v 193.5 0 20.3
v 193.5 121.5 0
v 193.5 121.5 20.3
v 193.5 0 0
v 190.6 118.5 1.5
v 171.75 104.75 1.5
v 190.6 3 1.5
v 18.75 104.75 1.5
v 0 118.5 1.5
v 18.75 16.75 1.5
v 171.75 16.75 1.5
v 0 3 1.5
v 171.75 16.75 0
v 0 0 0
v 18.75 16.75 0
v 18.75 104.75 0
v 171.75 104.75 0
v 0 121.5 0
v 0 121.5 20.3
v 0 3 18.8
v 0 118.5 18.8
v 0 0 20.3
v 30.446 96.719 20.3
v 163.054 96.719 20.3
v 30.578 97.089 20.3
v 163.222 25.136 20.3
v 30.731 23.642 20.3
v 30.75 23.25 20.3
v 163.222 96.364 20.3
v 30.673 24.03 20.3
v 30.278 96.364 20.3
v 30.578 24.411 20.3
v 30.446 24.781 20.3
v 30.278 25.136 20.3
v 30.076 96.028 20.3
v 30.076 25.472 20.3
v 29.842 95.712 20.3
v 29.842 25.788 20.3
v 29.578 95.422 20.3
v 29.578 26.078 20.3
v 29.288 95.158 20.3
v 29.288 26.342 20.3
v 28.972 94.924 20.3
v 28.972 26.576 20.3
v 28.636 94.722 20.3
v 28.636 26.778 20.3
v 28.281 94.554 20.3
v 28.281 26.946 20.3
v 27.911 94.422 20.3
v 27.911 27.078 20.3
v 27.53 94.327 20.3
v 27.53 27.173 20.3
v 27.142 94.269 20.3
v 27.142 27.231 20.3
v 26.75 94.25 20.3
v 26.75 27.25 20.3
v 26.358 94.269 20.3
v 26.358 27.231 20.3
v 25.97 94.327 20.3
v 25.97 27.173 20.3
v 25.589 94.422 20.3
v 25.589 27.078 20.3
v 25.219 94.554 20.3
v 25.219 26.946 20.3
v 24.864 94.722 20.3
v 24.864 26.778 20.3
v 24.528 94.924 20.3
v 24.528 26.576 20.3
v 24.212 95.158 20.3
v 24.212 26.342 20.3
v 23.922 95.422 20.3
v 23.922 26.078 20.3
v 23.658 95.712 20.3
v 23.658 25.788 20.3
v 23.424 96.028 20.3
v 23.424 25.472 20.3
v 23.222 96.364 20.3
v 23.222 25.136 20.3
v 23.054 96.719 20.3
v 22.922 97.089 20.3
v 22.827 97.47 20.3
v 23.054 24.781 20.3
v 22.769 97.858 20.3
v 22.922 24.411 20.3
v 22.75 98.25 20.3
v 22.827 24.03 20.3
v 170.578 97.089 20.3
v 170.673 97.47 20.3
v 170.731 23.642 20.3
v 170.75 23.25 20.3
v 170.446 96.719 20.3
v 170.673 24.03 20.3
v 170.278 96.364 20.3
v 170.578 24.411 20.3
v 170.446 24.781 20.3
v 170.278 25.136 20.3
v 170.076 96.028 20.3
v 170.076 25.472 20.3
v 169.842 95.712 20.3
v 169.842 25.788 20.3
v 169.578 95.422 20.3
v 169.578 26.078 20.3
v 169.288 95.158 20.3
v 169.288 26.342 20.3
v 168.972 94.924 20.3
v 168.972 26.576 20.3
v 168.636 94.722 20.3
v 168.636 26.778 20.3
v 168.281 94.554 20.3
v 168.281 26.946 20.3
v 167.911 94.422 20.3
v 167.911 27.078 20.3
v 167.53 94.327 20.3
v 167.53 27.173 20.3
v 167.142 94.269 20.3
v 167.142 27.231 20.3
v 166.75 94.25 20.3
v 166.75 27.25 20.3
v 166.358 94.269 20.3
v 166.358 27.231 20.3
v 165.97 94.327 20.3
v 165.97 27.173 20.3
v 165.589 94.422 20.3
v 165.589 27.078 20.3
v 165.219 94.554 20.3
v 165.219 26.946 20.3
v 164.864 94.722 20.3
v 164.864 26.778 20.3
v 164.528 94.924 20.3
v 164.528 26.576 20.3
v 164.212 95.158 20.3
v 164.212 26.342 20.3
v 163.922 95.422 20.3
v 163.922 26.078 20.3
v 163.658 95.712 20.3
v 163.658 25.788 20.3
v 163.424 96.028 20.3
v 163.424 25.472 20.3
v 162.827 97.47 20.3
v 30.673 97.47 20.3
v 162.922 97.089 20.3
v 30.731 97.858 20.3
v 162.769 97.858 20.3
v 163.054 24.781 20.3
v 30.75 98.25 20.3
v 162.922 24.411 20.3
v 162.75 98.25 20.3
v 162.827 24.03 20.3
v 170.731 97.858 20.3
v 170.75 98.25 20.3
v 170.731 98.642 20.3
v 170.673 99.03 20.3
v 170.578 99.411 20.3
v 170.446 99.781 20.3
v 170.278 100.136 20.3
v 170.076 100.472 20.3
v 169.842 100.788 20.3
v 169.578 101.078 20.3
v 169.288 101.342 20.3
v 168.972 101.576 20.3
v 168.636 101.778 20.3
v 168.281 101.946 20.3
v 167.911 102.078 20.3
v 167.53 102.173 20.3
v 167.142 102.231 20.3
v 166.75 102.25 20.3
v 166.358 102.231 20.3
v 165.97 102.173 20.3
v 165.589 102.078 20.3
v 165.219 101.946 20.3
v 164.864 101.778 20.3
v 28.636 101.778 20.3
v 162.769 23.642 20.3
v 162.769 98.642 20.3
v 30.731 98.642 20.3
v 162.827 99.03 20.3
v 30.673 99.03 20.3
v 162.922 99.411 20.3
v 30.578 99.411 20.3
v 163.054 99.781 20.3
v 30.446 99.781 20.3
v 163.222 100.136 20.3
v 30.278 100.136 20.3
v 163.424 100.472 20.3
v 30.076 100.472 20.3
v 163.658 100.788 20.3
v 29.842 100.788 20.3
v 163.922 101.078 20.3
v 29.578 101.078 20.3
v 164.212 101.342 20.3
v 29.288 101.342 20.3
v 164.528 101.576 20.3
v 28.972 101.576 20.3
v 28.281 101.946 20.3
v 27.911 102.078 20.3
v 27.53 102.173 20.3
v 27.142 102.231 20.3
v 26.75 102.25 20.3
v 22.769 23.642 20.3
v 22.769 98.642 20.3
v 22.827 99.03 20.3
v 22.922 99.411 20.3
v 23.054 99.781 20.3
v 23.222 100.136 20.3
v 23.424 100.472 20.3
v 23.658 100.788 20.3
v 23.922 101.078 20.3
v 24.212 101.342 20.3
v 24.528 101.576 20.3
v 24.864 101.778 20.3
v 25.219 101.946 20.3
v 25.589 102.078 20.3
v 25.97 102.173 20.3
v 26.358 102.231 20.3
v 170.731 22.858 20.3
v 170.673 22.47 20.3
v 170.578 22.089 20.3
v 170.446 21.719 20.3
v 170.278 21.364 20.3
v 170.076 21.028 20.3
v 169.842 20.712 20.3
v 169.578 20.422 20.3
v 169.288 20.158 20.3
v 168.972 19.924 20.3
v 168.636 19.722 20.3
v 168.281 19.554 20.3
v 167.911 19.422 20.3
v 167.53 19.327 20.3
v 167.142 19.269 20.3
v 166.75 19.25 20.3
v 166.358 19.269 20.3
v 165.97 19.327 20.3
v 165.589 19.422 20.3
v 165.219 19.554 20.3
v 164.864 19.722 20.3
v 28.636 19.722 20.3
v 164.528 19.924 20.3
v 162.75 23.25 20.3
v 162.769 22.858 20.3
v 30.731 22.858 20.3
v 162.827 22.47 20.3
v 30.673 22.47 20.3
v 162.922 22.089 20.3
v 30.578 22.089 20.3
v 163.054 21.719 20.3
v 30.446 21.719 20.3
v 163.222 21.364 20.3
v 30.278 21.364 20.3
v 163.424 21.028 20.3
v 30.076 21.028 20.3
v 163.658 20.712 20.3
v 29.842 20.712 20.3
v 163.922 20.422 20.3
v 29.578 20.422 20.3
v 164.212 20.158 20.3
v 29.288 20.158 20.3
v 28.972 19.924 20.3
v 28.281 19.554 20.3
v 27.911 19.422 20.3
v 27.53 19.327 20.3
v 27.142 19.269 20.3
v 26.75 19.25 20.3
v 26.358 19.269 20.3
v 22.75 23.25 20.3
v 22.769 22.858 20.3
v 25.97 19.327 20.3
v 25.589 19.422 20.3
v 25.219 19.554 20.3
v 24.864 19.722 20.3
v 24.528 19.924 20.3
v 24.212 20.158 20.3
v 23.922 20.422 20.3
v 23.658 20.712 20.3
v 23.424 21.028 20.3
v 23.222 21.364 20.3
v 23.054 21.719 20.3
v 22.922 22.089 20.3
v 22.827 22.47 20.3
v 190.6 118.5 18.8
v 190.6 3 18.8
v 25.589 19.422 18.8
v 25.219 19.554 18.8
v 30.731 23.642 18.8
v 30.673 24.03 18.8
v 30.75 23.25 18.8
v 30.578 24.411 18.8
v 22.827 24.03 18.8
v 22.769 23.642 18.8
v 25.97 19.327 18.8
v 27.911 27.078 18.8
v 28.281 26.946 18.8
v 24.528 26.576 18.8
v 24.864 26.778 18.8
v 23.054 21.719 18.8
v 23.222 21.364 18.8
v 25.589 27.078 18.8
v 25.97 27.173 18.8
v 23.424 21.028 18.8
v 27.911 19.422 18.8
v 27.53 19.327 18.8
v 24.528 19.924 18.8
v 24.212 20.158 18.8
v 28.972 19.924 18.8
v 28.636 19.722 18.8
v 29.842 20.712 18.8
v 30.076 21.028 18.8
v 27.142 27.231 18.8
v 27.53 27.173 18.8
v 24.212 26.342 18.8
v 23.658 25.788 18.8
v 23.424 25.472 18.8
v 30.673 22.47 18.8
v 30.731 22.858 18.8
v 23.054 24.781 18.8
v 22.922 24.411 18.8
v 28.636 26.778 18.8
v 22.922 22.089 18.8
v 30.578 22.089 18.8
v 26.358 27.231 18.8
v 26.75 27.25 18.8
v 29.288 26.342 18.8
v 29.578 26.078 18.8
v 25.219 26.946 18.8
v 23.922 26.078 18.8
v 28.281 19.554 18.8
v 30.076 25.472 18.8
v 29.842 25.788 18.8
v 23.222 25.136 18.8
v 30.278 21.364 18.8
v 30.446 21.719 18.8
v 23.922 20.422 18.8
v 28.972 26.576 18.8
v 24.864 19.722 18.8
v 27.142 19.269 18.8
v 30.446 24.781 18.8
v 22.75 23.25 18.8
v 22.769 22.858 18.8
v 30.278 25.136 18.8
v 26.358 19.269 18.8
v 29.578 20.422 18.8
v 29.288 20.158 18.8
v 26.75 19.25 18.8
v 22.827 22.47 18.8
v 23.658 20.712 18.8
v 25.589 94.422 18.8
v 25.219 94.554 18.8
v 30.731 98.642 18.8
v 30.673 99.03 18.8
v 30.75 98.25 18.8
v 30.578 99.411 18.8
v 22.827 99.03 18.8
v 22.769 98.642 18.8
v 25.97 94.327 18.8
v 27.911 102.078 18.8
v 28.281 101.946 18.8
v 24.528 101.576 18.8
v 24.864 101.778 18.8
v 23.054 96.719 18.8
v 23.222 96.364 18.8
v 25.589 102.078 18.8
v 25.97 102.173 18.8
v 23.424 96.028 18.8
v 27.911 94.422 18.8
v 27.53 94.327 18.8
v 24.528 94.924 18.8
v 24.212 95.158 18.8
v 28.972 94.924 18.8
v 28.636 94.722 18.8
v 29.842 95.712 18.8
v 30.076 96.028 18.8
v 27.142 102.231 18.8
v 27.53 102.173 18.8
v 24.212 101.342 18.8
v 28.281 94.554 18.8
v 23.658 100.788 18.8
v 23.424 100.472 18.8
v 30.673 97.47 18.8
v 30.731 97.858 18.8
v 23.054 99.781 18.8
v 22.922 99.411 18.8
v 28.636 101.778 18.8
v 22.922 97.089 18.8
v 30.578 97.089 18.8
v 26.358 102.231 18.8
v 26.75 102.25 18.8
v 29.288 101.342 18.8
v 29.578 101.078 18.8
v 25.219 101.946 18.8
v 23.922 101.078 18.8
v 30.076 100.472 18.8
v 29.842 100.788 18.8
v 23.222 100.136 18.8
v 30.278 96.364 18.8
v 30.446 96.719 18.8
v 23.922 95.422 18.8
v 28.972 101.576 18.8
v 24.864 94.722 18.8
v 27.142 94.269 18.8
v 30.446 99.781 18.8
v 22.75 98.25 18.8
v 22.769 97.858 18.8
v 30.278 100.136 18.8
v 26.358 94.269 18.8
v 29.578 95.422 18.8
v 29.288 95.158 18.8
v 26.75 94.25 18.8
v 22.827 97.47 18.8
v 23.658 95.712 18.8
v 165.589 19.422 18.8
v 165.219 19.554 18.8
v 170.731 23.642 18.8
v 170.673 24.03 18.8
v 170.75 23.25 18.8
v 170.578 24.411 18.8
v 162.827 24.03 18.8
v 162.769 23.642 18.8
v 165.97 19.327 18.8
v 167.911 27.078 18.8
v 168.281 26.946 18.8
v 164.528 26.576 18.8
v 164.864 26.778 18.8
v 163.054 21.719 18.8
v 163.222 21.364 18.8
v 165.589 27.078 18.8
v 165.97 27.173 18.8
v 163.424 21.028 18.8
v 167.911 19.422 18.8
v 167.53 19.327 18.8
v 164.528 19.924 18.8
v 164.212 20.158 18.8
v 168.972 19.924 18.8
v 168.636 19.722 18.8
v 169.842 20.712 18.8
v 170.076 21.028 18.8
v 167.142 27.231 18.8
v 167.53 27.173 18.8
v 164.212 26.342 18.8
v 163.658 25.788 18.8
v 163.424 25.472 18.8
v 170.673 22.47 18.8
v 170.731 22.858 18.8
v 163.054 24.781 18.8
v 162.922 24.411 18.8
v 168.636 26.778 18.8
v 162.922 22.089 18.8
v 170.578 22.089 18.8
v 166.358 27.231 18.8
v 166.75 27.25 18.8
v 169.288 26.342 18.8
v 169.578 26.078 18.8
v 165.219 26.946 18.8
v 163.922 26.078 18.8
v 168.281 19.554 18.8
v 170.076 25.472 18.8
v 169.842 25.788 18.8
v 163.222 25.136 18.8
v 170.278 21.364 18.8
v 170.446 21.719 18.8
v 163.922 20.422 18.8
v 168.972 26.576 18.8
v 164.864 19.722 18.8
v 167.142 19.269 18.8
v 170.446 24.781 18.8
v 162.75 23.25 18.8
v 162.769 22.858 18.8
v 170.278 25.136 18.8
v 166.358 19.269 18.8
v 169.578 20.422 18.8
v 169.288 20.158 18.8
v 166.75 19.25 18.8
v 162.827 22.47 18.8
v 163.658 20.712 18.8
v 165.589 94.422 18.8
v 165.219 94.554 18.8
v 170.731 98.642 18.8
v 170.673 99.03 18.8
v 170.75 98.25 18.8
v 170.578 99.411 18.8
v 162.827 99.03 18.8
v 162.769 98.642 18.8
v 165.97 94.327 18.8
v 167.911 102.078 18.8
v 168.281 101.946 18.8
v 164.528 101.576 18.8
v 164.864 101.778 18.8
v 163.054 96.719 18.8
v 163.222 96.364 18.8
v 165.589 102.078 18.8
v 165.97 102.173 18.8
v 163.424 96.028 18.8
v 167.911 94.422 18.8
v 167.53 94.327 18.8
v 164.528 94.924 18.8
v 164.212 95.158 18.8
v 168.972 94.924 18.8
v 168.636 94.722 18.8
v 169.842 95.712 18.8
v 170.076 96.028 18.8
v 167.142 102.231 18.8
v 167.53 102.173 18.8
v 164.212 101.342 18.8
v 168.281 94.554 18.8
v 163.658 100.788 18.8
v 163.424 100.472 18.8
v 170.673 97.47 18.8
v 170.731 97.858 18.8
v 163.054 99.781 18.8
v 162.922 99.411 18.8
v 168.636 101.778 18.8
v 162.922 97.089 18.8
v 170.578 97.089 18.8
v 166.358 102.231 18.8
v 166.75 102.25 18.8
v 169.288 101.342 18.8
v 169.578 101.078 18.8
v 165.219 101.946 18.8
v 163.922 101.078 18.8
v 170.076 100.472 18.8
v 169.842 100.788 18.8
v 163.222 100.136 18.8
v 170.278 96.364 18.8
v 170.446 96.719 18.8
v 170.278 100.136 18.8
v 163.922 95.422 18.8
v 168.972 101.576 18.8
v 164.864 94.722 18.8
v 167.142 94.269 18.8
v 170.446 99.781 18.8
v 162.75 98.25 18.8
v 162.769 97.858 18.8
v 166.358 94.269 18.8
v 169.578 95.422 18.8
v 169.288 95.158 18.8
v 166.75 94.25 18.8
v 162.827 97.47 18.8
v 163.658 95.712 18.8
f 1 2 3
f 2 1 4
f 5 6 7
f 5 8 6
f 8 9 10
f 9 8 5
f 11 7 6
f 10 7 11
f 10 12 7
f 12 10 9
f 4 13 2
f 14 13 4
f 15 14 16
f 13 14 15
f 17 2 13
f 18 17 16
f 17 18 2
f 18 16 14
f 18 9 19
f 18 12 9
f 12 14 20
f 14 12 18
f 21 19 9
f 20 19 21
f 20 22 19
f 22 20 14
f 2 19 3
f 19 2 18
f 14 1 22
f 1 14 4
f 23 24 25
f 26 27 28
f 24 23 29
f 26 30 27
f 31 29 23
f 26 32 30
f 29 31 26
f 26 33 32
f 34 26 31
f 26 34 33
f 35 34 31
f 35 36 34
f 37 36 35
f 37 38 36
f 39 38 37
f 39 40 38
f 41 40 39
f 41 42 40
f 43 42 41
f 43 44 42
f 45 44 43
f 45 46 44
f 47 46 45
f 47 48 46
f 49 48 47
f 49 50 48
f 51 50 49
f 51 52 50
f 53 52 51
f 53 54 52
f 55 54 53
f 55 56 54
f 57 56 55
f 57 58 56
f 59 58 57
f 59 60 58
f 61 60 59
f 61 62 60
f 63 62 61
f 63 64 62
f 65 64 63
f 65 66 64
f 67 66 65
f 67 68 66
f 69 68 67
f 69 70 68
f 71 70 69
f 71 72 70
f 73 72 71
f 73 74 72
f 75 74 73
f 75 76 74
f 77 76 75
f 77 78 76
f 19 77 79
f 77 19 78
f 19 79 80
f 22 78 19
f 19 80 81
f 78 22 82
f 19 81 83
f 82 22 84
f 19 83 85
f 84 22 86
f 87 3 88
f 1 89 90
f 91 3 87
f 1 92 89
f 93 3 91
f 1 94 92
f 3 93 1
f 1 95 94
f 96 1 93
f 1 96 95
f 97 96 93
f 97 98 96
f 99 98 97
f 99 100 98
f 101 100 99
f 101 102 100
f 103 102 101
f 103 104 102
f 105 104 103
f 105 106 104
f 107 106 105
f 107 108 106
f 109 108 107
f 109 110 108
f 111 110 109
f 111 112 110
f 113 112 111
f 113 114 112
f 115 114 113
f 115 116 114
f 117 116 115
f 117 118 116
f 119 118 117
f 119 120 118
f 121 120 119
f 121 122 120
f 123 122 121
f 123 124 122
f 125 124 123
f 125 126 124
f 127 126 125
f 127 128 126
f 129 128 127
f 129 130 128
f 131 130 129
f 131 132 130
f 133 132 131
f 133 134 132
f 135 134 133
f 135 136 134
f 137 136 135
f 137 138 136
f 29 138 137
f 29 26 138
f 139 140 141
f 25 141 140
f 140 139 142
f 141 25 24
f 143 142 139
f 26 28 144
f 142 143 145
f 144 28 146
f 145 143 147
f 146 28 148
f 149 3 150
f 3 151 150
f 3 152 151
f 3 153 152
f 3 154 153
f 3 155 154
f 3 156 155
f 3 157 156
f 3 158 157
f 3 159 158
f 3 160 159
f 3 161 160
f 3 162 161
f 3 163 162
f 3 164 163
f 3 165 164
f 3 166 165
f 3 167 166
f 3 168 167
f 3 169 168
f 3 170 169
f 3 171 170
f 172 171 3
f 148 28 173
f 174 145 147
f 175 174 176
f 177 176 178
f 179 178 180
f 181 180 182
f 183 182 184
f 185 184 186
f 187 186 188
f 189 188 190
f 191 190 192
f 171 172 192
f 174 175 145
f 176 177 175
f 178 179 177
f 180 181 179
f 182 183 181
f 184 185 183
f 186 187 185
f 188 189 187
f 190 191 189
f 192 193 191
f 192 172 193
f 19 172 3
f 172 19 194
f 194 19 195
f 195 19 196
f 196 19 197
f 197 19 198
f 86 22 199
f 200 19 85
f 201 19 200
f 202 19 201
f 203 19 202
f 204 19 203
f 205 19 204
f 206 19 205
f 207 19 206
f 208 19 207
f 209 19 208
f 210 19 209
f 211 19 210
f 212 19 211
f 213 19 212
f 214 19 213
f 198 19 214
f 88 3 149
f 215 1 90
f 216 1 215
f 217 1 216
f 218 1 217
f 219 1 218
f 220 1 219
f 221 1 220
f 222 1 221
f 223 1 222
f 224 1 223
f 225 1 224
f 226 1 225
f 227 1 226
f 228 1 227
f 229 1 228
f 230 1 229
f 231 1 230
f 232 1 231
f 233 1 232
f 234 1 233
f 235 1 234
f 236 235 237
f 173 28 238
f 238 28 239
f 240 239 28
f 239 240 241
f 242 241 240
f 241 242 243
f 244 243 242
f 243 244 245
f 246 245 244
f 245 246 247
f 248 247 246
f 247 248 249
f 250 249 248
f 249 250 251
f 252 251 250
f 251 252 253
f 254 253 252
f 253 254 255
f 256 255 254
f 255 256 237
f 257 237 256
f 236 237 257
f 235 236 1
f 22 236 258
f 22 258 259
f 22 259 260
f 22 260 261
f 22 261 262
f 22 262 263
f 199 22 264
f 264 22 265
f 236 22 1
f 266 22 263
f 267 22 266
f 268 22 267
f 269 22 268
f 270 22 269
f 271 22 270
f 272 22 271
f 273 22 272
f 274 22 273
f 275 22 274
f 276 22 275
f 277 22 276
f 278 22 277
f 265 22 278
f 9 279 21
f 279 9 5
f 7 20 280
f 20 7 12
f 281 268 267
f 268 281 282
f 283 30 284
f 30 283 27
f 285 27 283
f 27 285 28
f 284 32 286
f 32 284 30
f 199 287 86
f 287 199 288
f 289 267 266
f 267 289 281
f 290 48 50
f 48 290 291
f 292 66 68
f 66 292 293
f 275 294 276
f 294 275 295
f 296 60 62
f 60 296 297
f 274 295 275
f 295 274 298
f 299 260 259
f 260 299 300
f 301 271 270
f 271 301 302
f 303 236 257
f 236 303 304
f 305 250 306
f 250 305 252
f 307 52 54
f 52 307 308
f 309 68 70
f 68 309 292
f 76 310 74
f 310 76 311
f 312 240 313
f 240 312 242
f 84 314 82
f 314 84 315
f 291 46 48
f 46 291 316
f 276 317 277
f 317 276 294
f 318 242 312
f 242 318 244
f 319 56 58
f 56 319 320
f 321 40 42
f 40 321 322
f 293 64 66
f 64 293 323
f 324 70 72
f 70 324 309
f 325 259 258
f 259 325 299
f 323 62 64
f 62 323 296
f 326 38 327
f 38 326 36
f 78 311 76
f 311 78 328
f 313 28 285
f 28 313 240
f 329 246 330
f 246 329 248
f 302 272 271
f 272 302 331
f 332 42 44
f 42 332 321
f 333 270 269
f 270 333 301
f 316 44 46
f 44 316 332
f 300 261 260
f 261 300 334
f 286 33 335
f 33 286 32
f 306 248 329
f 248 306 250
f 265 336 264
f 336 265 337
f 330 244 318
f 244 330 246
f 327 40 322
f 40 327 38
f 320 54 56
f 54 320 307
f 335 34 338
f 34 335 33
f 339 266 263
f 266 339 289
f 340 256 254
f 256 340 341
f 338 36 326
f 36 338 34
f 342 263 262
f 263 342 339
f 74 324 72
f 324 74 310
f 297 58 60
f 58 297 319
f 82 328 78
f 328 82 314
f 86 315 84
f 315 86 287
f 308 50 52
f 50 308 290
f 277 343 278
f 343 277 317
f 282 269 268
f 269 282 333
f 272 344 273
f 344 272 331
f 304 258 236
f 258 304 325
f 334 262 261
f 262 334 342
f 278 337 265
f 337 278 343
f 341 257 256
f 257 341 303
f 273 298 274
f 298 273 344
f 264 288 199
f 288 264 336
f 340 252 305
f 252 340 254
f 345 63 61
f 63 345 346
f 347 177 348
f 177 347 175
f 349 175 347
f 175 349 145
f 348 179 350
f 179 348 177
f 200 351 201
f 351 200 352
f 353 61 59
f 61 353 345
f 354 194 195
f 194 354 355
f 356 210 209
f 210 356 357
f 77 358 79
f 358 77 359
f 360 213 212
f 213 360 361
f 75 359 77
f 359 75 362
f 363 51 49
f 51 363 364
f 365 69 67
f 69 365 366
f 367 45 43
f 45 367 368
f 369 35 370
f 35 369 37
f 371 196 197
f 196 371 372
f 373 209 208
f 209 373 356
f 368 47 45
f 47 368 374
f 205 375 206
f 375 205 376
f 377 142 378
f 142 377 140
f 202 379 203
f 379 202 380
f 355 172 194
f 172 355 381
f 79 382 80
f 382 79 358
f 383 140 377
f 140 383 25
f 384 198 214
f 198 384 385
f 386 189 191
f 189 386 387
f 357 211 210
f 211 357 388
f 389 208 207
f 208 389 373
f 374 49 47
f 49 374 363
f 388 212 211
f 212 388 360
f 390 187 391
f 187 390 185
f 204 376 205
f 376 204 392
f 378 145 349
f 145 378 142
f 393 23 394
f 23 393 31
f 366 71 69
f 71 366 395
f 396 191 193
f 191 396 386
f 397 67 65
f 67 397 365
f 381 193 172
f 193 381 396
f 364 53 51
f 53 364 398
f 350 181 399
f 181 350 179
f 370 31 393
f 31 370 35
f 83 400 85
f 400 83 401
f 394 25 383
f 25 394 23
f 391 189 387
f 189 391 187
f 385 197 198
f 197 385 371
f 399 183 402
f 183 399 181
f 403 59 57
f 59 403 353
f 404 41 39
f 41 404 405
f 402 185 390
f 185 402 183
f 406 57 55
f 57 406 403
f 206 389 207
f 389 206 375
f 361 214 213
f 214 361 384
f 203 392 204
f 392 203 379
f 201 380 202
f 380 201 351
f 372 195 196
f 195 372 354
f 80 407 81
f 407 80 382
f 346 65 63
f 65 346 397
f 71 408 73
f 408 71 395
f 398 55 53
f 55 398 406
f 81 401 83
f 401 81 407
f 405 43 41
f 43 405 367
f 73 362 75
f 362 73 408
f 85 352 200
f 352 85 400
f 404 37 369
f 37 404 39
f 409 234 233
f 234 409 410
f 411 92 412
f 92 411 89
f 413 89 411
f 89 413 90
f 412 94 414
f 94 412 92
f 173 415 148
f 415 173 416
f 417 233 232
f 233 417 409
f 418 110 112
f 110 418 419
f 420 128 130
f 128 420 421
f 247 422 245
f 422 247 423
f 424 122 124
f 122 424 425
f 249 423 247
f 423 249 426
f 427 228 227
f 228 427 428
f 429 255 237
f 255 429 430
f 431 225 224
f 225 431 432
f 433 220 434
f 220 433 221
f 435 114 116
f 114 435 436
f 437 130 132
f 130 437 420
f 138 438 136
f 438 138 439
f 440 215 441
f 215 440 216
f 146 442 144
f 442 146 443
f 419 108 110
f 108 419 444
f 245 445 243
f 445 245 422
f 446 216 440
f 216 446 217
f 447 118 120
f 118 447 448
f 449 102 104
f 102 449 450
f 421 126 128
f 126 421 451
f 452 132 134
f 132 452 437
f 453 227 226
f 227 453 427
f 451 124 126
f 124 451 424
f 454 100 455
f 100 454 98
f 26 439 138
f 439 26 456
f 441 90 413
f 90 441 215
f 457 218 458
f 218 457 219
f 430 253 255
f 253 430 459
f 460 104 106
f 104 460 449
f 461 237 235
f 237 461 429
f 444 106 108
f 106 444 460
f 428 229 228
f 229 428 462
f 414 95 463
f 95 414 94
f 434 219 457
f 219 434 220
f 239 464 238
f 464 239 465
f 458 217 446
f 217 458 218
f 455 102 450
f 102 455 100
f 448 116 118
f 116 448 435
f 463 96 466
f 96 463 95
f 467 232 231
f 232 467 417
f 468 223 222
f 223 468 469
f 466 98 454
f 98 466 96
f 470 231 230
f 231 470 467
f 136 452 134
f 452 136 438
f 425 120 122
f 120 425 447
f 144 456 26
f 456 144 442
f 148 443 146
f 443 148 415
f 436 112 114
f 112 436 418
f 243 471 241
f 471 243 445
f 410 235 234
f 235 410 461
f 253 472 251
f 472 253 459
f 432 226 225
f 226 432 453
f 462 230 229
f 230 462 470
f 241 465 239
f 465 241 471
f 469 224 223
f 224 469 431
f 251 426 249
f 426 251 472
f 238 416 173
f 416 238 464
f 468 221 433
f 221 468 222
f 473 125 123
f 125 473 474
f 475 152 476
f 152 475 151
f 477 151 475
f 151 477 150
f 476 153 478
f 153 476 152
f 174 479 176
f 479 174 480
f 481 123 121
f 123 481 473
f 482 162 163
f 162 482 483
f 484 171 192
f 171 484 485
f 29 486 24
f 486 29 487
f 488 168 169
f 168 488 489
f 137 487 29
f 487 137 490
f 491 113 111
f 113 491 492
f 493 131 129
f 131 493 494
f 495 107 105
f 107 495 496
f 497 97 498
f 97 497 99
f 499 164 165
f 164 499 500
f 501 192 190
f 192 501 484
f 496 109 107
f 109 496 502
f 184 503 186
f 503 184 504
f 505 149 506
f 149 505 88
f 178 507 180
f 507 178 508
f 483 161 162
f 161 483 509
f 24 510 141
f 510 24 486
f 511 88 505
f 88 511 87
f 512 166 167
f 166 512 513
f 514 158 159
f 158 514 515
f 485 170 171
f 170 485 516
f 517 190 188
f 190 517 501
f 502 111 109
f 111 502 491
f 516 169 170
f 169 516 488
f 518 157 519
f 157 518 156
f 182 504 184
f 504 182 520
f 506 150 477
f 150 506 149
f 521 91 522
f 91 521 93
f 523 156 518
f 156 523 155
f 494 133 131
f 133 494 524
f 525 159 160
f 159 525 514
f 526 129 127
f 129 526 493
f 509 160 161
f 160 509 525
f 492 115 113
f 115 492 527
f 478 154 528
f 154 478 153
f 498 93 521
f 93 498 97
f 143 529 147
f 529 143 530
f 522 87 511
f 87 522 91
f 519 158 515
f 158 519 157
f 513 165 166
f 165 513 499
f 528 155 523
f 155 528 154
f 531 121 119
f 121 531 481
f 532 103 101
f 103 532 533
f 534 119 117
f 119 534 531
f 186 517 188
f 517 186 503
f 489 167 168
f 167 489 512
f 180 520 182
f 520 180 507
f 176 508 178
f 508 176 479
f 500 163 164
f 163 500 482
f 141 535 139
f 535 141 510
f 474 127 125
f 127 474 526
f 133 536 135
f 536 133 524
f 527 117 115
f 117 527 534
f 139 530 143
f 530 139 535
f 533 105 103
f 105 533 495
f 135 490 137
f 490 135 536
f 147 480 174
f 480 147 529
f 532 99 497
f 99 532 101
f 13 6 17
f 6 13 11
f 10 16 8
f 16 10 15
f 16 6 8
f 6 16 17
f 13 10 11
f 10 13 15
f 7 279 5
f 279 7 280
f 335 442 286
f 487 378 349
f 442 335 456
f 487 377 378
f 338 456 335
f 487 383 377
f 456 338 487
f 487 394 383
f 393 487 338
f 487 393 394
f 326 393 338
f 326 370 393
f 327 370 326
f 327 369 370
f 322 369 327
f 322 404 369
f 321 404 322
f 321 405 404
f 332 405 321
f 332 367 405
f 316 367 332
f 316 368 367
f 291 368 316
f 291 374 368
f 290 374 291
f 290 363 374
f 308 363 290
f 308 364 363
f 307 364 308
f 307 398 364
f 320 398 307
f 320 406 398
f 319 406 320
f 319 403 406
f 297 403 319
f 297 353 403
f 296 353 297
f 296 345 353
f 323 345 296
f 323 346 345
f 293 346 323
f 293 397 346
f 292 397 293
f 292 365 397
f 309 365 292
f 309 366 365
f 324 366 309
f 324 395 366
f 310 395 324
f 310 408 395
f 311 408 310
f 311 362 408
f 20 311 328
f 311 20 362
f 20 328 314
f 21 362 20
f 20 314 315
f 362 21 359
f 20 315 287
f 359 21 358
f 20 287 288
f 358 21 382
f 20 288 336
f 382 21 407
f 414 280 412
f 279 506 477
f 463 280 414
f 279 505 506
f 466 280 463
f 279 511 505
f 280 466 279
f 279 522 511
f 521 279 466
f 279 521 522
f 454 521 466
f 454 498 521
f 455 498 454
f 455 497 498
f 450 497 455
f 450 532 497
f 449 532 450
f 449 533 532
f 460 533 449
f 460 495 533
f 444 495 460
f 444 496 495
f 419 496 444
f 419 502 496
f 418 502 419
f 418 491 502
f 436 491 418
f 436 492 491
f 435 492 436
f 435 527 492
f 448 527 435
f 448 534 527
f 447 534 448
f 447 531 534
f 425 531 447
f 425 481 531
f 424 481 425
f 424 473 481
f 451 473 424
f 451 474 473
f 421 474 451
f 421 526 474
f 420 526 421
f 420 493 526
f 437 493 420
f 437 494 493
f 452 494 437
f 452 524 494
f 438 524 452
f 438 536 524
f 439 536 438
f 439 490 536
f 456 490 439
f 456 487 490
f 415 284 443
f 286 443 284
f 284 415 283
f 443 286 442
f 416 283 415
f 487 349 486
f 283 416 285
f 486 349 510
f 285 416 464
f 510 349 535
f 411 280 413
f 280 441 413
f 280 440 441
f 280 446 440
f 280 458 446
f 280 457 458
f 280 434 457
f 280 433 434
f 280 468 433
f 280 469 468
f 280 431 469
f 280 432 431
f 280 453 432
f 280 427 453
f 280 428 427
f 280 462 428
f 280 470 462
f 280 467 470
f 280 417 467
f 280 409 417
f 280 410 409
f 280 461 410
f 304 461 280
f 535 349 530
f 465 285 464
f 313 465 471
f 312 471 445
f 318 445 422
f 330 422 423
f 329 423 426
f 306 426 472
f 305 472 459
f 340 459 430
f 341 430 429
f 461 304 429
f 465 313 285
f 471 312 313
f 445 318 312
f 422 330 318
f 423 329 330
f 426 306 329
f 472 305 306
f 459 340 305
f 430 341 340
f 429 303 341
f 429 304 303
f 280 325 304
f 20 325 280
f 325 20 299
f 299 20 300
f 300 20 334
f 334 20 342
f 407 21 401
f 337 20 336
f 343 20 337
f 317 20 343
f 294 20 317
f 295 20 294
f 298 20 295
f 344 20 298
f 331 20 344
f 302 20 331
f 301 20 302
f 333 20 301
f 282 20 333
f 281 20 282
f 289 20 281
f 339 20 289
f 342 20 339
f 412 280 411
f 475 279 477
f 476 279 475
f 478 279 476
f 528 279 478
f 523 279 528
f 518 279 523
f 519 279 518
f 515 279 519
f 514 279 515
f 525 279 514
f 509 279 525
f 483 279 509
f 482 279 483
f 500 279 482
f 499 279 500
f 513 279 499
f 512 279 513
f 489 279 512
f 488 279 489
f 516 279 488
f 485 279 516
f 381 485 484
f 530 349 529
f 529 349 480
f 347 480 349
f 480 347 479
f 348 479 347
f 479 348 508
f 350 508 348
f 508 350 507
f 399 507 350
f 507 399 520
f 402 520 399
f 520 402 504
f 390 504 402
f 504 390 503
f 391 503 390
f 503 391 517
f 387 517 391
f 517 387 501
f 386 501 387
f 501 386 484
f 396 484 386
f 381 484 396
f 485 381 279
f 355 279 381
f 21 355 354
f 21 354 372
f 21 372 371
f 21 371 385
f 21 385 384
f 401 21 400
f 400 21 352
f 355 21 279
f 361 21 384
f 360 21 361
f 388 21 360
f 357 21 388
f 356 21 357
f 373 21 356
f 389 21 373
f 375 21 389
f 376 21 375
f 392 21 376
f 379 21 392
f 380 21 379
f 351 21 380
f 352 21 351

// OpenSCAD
// Shitbox Rally — Waveshare 7-inch screen bezel
//
// Slide-in bezel for Waveshare 7" HDMI LCD (H). Screen slides in from the
// left (connector side). Retention lips on right, top, and bottom edges.
// Left edge open for HDMI, USB, and 3.5mm audio connectors.
// Backplate has bolt holes for dash bracket attachment.
//
// Print face-down on bed for best surface finish on visible front face.
//
// Measured with calipers 2026-04-17 ±0.5mm:
//   Screen case:  190 × 115 × 15mm
//   Case bezel:   20mm sides, 15mm top and bottom
//   Glass area:   150 × 85mm (derived)
//   Connectors:   all on left short edge
//   VESA:         none
//
// Units: mm.

$fn = 64;

// ---- Screen dimensions (measured 2026-04-17) ----
SCREEN_W     = 190;       // case width (landscape, long edge)
SCREEN_H     = 115;       // case height (short edge)
SCREEN_DEPTH = 17.3;      // case thickness (front glass to back, measured 2026-04-20)

// ---- Glass visible area (derived) ----
GLASS_W      = 150;       // 190 - 2 * 20
GLASS_H      = 85;        // 115 - 2 * 15

// ---- Case bezel insets (measured 2026-04-17) ----
BEZEL_L = 20;             // left (connector side — open)
BEZEL_R = 20;             // right
BEZEL_T = 15;             // top
BEZEL_B = 15;             // bottom

// ---- Bezel construction ----
BEZEL_WALL   = 3.0;       // side wall thickness (was 2.0, broke at joins)
BEZEL_LIP    = 1.5;       // front lip overlapping glass face (retention)
BEZEL_TOL    = 0.5;       // clearance around screen case
BACKPLATE_T  = 3.0;       // backplate thickness (structural)

// ---- Bracket attachment (custom spacing, no VESA) ----
BRACKET_HOLE_D  = 4.5;    // M4 clearance
BRACKET_CB_D    = 8.0;    // M4 socket head counterbore diameter
BRACKET_CB_DEPTH = 2.0;   // counterbore depth (screw head sits flush, leaves 1mm floor)
BRACKET_SPREAD_W = 140;   // horizontal bolt spacing
BRACKET_SPREAD_H = 75;    // vertical bolt spacing

// ---- Audio access ----
AUDIO_EXIT_D = 8;         // 3.5mm jack + plug clearance

// ---- Derived dimensions ----
// Cavity fits the screen case with tolerance
CAVITY_W = SCREEN_W + BEZEL_TOL;
CAVITY_H = SCREEN_H + BEZEL_TOL;
CAVITY_D = SCREEN_DEPTH;

// Outer bezel dimensions
OUTER_W = CAVITY_W + BEZEL_WALL;          // only right wall (left open)
OUTER_H = CAVITY_H + 2 * BEZEL_WALL;
TOTAL_D = CAVITY_D + BACKPLATE_T;


// =====================================================
//   Main
// =====================================================
screen_bezel();


// =====================================================
module screen_bezel() {
    difference() {
        union() {
            bezel_frame();
            bezel_backplate();
        }
        bezel_glass_window();
        bezel_screen_cavity();
        bezel_bracket_holes();
    }
}


// =====================================================
//   Solid components
// =====================================================
module bezel_frame() {
    // U-shaped frame: right wall, top wall, bottom wall
    // Left side open for slide-in and connector access
    // Front face has retention lips overlapping the glass

    // Front lip plate (covers full front except glass window)
    cube([OUTER_W, OUTER_H, BEZEL_LIP]);

    // Right wall
    translate([CAVITY_W, 0, 0])
        cube([BEZEL_WALL, OUTER_H, TOTAL_D]);

    // Top wall
    translate([0, CAVITY_H + BEZEL_WALL, 0])
        cube([OUTER_W, BEZEL_WALL, TOTAL_D]);

    // Bottom wall
    cube([OUTER_W, BEZEL_WALL, TOTAL_D]);
}

module bezel_backplate() {
    // Solid plate behind the screen
    translate([0, 0, CAVITY_D])
        cube([OUTER_W, OUTER_H, BACKPLATE_T]);
}

// (bosses removed — bracket bolts use flush counterbores in backplate)


// =====================================================
//   Cutouts
// =====================================================
module bezel_glass_window() {
    // Opening through front lip to expose glass
    // Centred on the glass area position
    win_x = BEZEL_L - BEZEL_LIP + BEZEL_TOL / 2;
    win_y = BEZEL_WALL + BEZEL_B - BEZEL_LIP + BEZEL_TOL / 2;
    translate([win_x, win_y, -0.1])
        cube([GLASS_W + 2 * BEZEL_LIP, GLASS_H + 2 * BEZEL_LIP, BEZEL_LIP + 0.2]);
}

module bezel_screen_cavity() {
    // Pocket for the screen case body (slides in from left)
    // Extends through the left wall (open side)
    translate([-0.1, BEZEL_WALL, BEZEL_LIP])
        cube([CAVITY_W + 0.2, CAVITY_H, CAVITY_D]);
}

module bezel_bracket_holes() {
    // M4 clearance holes through backplate with counterbores for flush screw heads
    cx = OUTER_W / 2;
    cy = OUTER_H / 2;
    for (sx = [-1, 1], sy = [-1, 1]) {
        translate([cx + sx * BRACKET_SPREAD_W / 2,
                   cy + sy * BRACKET_SPREAD_H / 2,
                   CAVITY_D - 0.1])
            cylinder(d = BRACKET_HOLE_D, h = BACKPLATE_T + 0.2);
        // Counterbore from back face
        translate([cx + sx * BRACKET_SPREAD_W / 2,
                   cy + sy * BRACKET_SPREAD_H / 2,
                   TOTAL_D - BRACKET_CB_DEPTH])
            cylinder(d = BRACKET_CB_D, h = BRACKET_CB_DEPTH + 0.1);
    }
}
